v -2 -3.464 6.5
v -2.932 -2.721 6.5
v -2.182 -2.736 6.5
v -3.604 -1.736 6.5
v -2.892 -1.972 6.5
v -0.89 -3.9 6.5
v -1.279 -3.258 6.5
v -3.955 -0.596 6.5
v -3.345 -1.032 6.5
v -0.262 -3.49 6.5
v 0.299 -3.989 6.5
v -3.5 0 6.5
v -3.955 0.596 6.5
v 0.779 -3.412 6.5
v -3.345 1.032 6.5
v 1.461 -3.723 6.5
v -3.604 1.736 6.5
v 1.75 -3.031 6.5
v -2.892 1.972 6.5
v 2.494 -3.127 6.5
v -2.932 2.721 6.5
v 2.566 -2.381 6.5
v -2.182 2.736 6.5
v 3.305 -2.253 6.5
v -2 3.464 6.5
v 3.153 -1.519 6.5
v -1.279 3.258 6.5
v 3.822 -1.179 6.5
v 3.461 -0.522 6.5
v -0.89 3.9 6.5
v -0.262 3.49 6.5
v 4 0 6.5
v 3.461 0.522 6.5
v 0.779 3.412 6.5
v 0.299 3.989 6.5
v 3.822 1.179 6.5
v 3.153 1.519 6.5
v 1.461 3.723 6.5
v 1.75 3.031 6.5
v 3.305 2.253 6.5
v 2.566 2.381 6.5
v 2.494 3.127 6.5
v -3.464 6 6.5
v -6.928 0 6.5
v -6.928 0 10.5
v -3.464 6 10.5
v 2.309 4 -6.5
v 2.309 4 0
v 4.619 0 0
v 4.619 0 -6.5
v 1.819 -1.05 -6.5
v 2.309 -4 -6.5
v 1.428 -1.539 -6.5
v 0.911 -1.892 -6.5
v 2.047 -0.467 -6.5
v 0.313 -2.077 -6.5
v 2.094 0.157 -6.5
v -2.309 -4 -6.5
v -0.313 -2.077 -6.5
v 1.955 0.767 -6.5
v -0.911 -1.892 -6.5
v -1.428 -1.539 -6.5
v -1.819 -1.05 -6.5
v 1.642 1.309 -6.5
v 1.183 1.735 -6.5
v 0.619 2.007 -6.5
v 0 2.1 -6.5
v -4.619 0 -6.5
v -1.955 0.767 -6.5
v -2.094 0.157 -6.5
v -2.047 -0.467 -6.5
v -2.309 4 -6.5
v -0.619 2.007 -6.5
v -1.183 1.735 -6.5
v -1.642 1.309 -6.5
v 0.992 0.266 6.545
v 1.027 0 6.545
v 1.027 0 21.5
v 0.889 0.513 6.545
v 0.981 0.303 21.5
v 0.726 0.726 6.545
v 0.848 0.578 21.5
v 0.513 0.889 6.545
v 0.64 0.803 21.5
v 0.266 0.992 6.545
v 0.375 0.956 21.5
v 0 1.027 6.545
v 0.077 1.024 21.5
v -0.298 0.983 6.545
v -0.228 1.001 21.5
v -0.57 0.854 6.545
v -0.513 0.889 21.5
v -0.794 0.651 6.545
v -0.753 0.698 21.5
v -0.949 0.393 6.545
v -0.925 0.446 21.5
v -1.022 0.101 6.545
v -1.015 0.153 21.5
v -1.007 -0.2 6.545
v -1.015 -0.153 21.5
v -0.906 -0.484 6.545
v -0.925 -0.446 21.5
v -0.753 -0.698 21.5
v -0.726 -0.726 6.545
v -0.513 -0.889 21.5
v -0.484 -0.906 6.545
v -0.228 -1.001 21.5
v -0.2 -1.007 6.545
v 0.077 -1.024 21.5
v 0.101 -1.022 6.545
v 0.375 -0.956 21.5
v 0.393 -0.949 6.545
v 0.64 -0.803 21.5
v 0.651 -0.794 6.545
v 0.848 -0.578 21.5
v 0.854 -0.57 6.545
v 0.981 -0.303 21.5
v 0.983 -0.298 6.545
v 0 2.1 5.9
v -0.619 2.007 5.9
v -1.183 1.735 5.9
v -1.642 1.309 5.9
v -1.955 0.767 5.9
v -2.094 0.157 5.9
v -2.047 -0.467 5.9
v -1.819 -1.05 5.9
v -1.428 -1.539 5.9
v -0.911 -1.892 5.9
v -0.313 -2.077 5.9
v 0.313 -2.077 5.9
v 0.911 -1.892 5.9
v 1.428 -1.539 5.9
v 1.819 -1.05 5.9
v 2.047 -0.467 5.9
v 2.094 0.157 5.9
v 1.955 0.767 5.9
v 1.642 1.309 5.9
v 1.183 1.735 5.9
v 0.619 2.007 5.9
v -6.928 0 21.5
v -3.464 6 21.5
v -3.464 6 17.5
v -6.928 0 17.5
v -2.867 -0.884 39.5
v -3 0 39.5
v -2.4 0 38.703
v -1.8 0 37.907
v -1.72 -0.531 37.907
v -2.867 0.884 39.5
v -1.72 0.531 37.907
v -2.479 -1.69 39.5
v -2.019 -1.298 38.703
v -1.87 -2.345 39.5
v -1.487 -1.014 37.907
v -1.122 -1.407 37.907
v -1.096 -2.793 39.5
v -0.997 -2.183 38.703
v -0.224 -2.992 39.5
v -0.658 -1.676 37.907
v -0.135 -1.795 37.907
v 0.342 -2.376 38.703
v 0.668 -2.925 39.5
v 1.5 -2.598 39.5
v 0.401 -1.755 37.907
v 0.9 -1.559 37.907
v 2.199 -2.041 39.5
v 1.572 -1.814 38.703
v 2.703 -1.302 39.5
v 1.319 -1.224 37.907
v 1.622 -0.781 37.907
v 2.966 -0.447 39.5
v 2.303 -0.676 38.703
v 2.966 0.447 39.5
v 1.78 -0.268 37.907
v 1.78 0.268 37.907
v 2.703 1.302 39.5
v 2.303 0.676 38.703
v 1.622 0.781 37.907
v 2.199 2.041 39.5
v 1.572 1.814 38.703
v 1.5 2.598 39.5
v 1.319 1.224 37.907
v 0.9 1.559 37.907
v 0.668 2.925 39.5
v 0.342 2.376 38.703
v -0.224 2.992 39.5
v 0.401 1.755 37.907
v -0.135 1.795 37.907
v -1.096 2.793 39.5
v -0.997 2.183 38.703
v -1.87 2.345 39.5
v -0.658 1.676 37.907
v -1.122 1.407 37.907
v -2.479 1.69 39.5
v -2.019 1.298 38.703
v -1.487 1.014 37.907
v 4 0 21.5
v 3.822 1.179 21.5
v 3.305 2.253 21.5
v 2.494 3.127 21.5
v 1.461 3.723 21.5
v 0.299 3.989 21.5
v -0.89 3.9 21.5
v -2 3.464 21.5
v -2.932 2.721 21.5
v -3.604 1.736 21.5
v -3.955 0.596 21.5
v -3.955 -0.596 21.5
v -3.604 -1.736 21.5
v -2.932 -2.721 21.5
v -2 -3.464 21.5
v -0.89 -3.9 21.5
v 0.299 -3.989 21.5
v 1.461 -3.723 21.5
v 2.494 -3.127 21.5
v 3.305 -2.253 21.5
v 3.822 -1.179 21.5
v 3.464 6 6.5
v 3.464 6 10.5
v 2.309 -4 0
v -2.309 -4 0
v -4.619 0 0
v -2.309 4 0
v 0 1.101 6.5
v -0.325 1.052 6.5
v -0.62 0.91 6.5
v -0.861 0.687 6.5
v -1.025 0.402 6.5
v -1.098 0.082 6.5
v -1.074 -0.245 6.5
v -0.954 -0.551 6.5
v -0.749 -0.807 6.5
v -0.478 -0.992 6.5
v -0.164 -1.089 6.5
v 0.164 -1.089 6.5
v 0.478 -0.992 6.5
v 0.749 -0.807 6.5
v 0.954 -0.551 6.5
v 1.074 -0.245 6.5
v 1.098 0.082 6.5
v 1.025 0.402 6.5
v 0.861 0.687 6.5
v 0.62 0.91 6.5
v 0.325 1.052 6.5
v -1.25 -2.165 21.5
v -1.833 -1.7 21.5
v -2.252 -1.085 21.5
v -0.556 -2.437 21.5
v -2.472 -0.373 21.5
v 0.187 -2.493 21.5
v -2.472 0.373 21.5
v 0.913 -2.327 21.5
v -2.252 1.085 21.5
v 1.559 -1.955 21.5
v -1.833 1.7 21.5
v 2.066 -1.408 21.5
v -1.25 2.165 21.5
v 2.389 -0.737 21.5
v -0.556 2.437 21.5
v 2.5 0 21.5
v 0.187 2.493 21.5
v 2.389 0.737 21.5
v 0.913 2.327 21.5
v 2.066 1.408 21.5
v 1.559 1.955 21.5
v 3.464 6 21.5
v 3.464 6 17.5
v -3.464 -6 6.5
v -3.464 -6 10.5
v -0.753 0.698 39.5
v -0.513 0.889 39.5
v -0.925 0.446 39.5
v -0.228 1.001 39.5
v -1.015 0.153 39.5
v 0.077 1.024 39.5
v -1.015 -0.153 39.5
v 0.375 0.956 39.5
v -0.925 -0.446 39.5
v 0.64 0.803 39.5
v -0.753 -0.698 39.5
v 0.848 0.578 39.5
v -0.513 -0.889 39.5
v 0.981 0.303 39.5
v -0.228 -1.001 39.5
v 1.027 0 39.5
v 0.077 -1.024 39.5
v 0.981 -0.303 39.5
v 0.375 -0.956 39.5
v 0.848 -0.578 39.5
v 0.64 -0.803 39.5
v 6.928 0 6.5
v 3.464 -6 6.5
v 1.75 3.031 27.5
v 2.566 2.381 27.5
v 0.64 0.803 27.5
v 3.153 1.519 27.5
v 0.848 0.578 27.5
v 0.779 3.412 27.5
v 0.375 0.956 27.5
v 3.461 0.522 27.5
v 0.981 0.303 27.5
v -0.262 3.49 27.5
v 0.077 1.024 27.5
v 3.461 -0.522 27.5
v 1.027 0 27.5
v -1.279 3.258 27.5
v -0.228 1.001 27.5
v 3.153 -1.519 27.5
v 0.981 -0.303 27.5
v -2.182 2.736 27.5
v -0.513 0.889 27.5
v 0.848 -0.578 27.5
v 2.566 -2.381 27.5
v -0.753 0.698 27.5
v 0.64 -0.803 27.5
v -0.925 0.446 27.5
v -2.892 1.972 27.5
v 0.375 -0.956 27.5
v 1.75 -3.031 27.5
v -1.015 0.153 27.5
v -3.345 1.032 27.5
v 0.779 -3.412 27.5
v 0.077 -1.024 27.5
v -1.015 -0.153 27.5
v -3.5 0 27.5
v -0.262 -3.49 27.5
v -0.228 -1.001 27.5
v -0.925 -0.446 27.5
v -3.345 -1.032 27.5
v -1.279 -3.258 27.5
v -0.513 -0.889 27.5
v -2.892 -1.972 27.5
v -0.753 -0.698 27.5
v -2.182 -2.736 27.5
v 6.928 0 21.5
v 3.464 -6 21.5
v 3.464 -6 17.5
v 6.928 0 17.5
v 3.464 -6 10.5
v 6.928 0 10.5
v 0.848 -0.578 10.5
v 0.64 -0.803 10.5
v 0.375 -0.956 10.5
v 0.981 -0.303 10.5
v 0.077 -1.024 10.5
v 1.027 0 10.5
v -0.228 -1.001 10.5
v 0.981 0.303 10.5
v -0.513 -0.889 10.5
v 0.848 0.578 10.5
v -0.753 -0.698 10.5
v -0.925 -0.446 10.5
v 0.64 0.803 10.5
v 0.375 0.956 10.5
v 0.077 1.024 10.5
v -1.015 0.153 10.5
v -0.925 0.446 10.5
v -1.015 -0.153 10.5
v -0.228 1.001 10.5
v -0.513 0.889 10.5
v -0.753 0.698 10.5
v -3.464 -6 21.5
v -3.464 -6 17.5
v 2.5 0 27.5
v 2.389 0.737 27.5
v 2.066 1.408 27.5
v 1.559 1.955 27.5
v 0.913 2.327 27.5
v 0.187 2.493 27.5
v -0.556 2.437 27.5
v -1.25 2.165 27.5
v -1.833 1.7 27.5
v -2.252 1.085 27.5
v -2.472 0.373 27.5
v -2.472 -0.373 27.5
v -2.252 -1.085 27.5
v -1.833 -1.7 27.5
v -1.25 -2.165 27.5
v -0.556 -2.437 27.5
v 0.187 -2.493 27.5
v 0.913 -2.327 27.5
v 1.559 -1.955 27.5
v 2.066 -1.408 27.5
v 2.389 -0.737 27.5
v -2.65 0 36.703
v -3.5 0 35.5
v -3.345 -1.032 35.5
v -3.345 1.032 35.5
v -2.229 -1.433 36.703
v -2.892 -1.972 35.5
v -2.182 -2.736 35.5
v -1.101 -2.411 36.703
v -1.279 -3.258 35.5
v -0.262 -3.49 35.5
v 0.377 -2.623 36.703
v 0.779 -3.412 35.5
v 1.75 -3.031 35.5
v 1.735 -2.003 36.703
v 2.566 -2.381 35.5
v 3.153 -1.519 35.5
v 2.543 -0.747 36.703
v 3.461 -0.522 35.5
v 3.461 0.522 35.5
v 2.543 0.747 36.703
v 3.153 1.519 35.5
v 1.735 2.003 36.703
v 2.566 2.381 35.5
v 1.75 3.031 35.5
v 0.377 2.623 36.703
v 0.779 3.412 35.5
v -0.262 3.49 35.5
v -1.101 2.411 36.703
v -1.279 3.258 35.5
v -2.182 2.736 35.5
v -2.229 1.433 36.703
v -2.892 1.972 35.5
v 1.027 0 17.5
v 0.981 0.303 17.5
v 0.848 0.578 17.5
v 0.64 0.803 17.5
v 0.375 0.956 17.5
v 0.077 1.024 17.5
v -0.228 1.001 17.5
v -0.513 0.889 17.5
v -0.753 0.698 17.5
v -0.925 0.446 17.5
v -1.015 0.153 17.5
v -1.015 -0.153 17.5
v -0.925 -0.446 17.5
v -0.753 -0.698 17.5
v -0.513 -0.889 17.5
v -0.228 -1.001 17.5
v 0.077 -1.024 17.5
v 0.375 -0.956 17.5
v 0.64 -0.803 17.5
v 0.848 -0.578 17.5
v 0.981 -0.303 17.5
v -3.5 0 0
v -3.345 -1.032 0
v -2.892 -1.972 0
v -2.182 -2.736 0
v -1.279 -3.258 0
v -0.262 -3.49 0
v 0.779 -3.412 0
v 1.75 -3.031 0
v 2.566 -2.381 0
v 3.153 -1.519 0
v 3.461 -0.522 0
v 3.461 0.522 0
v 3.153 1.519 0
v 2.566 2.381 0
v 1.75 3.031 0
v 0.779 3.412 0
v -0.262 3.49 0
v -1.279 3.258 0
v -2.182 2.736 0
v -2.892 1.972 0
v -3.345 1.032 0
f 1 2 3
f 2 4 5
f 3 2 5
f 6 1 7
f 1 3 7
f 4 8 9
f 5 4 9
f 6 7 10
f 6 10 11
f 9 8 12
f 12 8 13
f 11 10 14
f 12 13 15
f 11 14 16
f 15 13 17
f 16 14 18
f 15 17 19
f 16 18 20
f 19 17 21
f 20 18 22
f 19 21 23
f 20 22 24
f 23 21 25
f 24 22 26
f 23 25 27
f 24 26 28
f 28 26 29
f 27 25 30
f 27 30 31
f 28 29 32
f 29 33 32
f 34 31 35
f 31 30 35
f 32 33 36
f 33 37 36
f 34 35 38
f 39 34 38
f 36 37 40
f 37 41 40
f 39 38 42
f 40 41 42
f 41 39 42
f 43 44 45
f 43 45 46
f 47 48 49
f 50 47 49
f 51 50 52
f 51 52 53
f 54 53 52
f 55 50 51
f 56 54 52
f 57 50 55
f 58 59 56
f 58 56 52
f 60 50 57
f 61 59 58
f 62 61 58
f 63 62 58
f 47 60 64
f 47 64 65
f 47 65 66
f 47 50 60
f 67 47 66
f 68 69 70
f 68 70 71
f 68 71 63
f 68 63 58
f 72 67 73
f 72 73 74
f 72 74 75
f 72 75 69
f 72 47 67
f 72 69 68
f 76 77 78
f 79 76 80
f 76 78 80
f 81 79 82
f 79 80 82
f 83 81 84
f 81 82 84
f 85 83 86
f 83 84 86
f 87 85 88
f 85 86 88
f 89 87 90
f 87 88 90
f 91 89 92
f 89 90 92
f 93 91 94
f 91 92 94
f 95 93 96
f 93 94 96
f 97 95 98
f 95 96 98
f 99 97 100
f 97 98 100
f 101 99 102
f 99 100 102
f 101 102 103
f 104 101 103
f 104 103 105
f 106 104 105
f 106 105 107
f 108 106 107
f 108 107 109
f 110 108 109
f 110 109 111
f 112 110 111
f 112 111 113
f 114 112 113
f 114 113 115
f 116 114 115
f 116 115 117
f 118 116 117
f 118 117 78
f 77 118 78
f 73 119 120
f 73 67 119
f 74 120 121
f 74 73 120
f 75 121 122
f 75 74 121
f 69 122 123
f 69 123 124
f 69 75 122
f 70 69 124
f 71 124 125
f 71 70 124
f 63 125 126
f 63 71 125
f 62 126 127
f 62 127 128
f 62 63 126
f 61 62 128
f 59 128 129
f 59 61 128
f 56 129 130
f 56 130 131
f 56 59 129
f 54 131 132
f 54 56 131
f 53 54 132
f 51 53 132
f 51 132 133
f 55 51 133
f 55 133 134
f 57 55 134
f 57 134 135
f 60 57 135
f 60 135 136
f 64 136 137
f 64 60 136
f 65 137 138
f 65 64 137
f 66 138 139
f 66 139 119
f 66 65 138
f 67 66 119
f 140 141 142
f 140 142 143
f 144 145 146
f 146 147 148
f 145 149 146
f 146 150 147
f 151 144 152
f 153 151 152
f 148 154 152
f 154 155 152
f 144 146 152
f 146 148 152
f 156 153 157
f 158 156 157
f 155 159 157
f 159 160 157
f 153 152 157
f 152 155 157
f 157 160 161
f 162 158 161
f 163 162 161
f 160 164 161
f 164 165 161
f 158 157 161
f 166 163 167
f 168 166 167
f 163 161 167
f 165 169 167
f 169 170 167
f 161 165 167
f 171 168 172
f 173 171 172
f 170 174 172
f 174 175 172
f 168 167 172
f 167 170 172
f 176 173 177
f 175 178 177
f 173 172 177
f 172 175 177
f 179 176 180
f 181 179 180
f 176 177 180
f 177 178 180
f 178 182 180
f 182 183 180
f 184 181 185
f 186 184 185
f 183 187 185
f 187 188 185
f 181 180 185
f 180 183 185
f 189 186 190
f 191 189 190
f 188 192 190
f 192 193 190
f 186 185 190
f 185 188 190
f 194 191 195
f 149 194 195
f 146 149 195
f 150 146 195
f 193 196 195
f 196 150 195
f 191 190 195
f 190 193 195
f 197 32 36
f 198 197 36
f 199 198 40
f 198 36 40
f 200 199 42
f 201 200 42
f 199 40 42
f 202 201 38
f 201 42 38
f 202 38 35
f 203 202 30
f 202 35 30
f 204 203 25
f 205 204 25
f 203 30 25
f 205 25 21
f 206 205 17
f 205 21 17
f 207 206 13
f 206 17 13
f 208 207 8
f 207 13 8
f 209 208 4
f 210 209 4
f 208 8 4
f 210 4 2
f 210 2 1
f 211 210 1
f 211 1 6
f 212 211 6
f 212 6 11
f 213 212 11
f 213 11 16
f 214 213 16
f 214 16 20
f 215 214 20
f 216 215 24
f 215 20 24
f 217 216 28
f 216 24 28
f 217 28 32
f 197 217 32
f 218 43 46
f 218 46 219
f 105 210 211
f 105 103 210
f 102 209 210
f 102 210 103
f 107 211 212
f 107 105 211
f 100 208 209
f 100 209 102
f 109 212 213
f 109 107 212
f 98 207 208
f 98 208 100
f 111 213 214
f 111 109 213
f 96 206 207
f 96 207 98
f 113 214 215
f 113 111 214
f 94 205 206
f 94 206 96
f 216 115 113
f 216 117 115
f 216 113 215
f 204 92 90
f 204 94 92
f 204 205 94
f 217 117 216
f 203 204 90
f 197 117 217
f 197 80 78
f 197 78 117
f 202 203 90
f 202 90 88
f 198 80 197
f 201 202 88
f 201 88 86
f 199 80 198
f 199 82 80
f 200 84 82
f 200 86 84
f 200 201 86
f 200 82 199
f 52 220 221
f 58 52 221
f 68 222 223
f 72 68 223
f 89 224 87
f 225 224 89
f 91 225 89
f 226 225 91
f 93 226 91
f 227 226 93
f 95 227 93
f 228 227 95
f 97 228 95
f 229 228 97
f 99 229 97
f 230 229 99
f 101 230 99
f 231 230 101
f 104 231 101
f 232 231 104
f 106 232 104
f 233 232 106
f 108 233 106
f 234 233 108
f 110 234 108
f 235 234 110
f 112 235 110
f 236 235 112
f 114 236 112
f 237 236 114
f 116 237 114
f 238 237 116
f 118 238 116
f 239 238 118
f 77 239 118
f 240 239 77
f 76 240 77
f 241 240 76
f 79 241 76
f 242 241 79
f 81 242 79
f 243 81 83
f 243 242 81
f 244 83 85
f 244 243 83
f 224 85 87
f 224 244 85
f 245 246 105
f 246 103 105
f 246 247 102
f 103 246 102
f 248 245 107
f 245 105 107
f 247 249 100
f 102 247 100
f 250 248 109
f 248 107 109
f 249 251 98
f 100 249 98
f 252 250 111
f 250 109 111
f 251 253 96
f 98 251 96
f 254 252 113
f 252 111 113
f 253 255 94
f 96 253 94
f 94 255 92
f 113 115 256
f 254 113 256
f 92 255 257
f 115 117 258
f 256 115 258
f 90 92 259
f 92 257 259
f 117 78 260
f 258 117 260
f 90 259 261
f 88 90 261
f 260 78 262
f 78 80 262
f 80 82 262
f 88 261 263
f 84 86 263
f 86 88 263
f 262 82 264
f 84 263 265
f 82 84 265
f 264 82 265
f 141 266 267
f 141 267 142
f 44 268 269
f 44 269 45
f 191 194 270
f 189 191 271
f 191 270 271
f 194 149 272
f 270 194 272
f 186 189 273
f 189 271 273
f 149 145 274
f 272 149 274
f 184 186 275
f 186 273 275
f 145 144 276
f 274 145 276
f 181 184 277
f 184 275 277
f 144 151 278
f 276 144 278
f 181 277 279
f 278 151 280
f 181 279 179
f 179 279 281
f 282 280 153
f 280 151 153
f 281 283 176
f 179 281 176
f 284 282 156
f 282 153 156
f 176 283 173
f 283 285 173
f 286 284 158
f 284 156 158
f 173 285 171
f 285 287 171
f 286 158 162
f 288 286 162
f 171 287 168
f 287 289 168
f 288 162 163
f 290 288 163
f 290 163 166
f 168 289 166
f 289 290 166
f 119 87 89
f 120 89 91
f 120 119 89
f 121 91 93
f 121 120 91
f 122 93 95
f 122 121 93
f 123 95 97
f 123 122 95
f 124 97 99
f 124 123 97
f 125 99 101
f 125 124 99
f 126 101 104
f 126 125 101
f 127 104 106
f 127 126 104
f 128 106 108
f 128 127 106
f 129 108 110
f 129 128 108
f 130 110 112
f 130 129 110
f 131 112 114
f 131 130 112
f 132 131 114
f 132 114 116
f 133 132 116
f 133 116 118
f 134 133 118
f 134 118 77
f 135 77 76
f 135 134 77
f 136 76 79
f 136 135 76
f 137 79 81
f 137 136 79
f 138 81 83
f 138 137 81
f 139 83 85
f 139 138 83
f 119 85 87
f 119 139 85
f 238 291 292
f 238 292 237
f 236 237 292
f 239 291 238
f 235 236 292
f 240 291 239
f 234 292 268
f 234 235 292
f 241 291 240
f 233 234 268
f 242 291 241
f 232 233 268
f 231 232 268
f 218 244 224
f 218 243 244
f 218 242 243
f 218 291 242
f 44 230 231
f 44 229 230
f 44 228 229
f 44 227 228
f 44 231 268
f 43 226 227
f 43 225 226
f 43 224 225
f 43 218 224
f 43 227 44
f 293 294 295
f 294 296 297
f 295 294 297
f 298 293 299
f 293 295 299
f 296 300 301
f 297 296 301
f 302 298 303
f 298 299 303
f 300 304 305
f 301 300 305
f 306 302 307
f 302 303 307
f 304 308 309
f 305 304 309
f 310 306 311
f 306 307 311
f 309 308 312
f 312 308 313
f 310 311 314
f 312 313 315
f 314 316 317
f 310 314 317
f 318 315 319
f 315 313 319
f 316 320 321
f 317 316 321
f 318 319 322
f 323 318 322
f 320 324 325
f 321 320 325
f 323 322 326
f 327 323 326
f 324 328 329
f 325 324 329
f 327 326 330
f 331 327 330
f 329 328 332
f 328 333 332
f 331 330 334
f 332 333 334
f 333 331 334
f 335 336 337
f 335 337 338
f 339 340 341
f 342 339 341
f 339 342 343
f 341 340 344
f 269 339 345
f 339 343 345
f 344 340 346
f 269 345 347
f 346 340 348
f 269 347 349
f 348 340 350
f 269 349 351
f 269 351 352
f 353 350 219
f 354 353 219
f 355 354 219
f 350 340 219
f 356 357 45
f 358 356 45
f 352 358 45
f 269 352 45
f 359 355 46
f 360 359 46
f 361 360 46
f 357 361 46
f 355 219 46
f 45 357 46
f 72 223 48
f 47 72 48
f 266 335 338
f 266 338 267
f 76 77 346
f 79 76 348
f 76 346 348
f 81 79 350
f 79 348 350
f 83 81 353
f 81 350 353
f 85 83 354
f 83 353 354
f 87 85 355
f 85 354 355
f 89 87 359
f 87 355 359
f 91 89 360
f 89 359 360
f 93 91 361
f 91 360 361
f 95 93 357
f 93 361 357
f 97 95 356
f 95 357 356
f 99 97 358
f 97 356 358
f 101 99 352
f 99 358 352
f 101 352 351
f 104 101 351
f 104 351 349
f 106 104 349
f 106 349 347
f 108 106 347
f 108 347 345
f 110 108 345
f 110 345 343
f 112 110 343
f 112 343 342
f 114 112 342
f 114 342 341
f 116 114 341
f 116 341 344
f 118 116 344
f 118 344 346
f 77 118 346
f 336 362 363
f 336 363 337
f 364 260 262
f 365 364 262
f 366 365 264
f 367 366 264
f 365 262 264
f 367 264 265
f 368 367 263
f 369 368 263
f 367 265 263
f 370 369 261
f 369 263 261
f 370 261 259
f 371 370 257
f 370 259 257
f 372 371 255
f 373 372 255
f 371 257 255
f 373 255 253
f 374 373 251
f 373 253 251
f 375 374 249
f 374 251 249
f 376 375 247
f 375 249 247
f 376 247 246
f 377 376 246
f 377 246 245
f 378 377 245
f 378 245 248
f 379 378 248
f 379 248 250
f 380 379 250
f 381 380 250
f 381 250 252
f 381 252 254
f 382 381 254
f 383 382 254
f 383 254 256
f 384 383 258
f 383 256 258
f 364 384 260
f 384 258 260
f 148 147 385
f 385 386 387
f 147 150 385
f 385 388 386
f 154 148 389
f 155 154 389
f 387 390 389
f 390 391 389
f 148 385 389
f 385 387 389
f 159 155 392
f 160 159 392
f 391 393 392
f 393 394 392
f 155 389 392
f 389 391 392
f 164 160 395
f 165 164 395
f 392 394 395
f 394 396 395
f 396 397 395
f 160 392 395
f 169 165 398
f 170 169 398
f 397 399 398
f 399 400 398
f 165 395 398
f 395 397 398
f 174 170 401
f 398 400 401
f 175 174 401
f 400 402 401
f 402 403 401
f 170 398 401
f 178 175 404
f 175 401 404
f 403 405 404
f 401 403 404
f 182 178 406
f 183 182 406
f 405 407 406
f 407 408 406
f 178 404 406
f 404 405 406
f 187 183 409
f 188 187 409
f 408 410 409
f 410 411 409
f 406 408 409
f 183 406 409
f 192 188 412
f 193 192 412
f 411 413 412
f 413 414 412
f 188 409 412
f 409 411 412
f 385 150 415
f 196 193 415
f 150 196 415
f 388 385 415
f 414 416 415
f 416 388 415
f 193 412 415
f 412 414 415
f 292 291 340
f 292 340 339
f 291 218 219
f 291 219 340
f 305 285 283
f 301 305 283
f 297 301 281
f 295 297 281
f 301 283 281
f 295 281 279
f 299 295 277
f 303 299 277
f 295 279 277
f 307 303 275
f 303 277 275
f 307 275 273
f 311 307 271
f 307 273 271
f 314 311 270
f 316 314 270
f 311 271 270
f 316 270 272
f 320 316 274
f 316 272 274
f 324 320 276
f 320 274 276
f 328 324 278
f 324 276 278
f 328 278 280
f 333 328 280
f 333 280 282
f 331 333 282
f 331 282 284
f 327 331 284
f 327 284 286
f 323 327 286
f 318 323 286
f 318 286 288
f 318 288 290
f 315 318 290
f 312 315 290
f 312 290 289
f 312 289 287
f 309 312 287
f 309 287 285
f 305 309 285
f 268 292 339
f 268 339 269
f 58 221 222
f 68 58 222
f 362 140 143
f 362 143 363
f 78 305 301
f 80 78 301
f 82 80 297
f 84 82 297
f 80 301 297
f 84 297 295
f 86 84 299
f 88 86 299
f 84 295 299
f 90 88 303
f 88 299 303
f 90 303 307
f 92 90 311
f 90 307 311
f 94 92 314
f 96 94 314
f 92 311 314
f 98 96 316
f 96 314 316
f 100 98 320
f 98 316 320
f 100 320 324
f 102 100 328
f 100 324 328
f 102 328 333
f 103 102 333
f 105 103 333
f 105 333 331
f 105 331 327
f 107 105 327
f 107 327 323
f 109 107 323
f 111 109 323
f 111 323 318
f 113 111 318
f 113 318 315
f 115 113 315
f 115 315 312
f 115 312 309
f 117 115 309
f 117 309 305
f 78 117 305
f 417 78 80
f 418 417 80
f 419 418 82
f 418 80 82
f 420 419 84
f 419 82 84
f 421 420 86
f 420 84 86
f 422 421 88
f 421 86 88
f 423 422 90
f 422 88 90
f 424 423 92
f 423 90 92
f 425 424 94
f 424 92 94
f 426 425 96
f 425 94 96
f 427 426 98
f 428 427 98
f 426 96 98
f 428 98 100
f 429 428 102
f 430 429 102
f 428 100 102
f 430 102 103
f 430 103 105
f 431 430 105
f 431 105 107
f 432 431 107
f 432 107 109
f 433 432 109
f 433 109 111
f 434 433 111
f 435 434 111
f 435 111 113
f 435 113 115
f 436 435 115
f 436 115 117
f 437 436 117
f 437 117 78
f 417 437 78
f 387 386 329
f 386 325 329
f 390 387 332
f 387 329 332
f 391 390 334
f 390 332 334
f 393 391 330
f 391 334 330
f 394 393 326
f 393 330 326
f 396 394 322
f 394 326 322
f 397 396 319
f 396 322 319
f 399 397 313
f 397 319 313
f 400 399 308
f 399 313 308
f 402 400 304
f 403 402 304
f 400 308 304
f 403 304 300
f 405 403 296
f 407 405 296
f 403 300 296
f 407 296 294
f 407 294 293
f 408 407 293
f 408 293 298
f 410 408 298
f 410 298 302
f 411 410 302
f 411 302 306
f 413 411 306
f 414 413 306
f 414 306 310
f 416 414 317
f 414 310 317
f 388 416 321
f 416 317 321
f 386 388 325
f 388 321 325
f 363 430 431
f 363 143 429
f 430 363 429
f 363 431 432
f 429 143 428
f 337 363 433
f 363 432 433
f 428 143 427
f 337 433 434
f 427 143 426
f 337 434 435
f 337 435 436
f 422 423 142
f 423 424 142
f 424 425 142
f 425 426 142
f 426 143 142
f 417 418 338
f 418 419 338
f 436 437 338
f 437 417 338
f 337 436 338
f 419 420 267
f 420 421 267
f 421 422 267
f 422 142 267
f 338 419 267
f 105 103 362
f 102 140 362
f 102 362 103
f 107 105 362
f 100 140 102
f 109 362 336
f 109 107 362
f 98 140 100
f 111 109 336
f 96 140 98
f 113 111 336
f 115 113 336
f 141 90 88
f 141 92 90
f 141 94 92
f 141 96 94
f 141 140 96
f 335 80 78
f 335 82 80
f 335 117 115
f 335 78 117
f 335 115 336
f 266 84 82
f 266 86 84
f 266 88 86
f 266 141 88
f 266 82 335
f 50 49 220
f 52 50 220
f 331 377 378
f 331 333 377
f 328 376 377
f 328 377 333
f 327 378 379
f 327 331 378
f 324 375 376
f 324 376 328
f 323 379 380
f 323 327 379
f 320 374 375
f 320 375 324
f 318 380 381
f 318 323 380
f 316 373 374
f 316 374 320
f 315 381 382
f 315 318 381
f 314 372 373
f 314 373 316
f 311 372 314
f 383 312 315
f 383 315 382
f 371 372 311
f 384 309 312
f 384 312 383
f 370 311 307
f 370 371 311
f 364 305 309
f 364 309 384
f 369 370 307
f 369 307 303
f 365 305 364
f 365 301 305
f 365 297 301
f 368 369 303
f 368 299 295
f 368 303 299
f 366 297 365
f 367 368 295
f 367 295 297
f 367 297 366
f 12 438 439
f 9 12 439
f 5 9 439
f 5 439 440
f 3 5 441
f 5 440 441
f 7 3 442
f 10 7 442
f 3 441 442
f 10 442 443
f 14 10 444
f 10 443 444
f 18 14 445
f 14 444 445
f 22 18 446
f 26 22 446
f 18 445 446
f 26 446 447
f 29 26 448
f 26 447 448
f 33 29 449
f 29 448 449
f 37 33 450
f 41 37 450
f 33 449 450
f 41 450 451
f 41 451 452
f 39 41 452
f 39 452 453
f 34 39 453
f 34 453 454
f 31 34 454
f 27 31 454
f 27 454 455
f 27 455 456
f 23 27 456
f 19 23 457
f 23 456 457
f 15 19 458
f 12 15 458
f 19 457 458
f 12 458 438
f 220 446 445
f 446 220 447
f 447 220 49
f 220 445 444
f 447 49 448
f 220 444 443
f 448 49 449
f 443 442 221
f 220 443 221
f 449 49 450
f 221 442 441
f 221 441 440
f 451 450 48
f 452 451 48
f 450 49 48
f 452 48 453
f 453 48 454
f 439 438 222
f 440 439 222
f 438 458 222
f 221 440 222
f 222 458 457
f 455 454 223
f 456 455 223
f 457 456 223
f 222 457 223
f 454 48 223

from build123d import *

# Parameters (mm, degrees)
SKETCH_1_R          = 3.5
EXTRUDE_1_DEPTH     = 6.5
EXTRUDE_2_DEPTH     = 6.5
SKETCH_3_R          = 4
EXTRUDE_3_DEPTH     = 15
EXTRUDE_4_DEPTH     = 4
EXTRUDE_5_DEPTH     = 4
SKETCH_6_R          = 2.5
EXTRUDE_6_DEPTH     = 6
SKETCH_10_R         = 1.026794083
CUT_EXTRUDE_1_DEPTH = 47.904157598


with BuildPart() as part:
    # 草图1 → 凸台-拉伸1 (new body)
    with BuildSketch(Plane.XY):
        Circle(SKETCH_1_R)
    extrude(amount=EXTRUDE_1_DEPTH)

    # 草图2 → 凸台-拉伸2 (add)
    with BuildSketch(Plane(origin=(0, 0, 0), x_dir=(-1, 0, 0), z_dir=(0, 0, -1))):
        Polygon((-4.618802154, 0), (-2.309401077, -4), (2.309401077, -4), (4.618802154, 0), (2.309401077, 4), (-2.309401077, 4), align=None)
    extrude(amount=EXTRUDE_2_DEPTH)

    # 草图3 → 凸台-拉伸3 (add)
    with BuildSketch(Plane.XY.offset(6.5)):
        Circle(SKETCH_3_R)
    extrude(amount=EXTRUDE_3_DEPTH)


with BuildPart() as body_2:
    # 草图4 → 凸台-拉伸4 (new body)
    with BuildSketch(Plane(origin=(0, 0, 6.5), x_dir=(-1, 0, 0), z_dir=(0, 0, -1))):
        Polygon((-3.464101615, 6), (-6.92820323, 0), (-3.464101615, -6), (3.464101615, -6), (6.92820323, 0), (3.464101615, 6), align=None)
    extrude(amount=-EXTRUDE_4_DEPTH)


with BuildPart() as body_3:
    # 草图5 → 凸台-拉伸5 (new body)
    with BuildSketch(Plane.XY.offset(21.5)):
        Polygon((3.464101615, 6), (-3.464101615, 6), (-6.92820323, 0), (-3.464101615, -6), (3.464101615, -6), (6.92820323, 0), align=None)
    extrude(amount=-EXTRUDE_5_DEPTH)


with BuildPart() as body_4:
    # 草图6 → 凸台-拉伸6 (new body)
    with BuildSketch(Plane.XY.offset(21.5)):
        Circle(SKETCH_6_R)
    extrude(amount=EXTRUDE_6_DEPTH)


with BuildPart() as body_5:
    # 草图7 → 旋转1 (revolve)
    with BuildSketch(Plane(origin=(0, 0, 0), x_dir=(1, 0, 0), z_dir=(0, 1, 0))):
        Polygon((0, -27.5), (0, -39.5), (3, -39.5), (1.8, -37.90681576), (3.5, -35.5), (3.5, -27.5), align=None)
    revolve(axis=Axis((0, 0, 27.5), (0, 0, 1)))


with BuildPart() as hole_wizard_m5_1_tool:
    # 草图8 → M5 螺纹孔1 (revolve)
    with BuildSketch(Plane(origin=(0, 0, -6.5), x_dir=(0, 1, 0), z_dir=(1, 0, 0))):
        Polygon((0, 0), (0, 13.6618073), (2.1, 12.4), (2.1, 0), align=None)
    revolve(axis=Axis((0, 0, -12.85), (0, 0, 1)))


with BuildPart() as part_1:
    add(part.part)

    # M5 螺纹孔1: cut by hole_wizard_m5_1_tool
    add(hole_wizard_m5_1_tool.part, mode=Mode.SUBTRACT)


with BuildPart() as body_2_1:
    add(body_2.part)

    # M5 螺纹孔1: cut by hole_wizard_m5_1_tool
    add(hole_wizard_m5_1_tool.part, mode=Mode.SUBTRACT)


with BuildPart() as cut_extrude_1_tool:
    # 草图10 → 切除-拉伸1 (new, through all)
    with BuildSketch(Plane.XY.offset(39.5)):
        Circle(SKETCH_10_R)
    extrude(amount=-CUT_EXTRUDE_1_DEPTH)


with BuildPart() as part_2:
    add(part_1.part)

    # 切除-拉伸1: cut by cut_extrude_1_tool
    add(cut_extrude_1_tool.part, mode=Mode.SUBTRACT)


with BuildPart() as body_2_2:
    add(body_2_1.part)

    # 切除-拉伸1: cut by cut_extrude_1_tool
    add(cut_extrude_1_tool.part, mode=Mode.SUBTRACT)


with BuildPart() as body_3_1:
    add(body_3.part)

    # 切除-拉伸1: cut by cut_extrude_1_tool
    add(cut_extrude_1_tool.part, mode=Mode.SUBTRACT)


with BuildPart() as body_4_1:
    add(body_4.part)

    # 切除-拉伸1: cut by cut_extrude_1_tool
    add(cut_extrude_1_tool.part, mode=Mode.SUBTRACT)


with BuildPart() as body_5_1:
    add(body_5.part)

    # 切除-拉伸1: cut by cut_extrude_1_tool
    add(cut_extrude_1_tool.part, mode=Mode.SUBTRACT)


solid = Compound([part_2.part, body_2_2.part, body_3_1.part, body_4_1.part, body_5_1.part])
